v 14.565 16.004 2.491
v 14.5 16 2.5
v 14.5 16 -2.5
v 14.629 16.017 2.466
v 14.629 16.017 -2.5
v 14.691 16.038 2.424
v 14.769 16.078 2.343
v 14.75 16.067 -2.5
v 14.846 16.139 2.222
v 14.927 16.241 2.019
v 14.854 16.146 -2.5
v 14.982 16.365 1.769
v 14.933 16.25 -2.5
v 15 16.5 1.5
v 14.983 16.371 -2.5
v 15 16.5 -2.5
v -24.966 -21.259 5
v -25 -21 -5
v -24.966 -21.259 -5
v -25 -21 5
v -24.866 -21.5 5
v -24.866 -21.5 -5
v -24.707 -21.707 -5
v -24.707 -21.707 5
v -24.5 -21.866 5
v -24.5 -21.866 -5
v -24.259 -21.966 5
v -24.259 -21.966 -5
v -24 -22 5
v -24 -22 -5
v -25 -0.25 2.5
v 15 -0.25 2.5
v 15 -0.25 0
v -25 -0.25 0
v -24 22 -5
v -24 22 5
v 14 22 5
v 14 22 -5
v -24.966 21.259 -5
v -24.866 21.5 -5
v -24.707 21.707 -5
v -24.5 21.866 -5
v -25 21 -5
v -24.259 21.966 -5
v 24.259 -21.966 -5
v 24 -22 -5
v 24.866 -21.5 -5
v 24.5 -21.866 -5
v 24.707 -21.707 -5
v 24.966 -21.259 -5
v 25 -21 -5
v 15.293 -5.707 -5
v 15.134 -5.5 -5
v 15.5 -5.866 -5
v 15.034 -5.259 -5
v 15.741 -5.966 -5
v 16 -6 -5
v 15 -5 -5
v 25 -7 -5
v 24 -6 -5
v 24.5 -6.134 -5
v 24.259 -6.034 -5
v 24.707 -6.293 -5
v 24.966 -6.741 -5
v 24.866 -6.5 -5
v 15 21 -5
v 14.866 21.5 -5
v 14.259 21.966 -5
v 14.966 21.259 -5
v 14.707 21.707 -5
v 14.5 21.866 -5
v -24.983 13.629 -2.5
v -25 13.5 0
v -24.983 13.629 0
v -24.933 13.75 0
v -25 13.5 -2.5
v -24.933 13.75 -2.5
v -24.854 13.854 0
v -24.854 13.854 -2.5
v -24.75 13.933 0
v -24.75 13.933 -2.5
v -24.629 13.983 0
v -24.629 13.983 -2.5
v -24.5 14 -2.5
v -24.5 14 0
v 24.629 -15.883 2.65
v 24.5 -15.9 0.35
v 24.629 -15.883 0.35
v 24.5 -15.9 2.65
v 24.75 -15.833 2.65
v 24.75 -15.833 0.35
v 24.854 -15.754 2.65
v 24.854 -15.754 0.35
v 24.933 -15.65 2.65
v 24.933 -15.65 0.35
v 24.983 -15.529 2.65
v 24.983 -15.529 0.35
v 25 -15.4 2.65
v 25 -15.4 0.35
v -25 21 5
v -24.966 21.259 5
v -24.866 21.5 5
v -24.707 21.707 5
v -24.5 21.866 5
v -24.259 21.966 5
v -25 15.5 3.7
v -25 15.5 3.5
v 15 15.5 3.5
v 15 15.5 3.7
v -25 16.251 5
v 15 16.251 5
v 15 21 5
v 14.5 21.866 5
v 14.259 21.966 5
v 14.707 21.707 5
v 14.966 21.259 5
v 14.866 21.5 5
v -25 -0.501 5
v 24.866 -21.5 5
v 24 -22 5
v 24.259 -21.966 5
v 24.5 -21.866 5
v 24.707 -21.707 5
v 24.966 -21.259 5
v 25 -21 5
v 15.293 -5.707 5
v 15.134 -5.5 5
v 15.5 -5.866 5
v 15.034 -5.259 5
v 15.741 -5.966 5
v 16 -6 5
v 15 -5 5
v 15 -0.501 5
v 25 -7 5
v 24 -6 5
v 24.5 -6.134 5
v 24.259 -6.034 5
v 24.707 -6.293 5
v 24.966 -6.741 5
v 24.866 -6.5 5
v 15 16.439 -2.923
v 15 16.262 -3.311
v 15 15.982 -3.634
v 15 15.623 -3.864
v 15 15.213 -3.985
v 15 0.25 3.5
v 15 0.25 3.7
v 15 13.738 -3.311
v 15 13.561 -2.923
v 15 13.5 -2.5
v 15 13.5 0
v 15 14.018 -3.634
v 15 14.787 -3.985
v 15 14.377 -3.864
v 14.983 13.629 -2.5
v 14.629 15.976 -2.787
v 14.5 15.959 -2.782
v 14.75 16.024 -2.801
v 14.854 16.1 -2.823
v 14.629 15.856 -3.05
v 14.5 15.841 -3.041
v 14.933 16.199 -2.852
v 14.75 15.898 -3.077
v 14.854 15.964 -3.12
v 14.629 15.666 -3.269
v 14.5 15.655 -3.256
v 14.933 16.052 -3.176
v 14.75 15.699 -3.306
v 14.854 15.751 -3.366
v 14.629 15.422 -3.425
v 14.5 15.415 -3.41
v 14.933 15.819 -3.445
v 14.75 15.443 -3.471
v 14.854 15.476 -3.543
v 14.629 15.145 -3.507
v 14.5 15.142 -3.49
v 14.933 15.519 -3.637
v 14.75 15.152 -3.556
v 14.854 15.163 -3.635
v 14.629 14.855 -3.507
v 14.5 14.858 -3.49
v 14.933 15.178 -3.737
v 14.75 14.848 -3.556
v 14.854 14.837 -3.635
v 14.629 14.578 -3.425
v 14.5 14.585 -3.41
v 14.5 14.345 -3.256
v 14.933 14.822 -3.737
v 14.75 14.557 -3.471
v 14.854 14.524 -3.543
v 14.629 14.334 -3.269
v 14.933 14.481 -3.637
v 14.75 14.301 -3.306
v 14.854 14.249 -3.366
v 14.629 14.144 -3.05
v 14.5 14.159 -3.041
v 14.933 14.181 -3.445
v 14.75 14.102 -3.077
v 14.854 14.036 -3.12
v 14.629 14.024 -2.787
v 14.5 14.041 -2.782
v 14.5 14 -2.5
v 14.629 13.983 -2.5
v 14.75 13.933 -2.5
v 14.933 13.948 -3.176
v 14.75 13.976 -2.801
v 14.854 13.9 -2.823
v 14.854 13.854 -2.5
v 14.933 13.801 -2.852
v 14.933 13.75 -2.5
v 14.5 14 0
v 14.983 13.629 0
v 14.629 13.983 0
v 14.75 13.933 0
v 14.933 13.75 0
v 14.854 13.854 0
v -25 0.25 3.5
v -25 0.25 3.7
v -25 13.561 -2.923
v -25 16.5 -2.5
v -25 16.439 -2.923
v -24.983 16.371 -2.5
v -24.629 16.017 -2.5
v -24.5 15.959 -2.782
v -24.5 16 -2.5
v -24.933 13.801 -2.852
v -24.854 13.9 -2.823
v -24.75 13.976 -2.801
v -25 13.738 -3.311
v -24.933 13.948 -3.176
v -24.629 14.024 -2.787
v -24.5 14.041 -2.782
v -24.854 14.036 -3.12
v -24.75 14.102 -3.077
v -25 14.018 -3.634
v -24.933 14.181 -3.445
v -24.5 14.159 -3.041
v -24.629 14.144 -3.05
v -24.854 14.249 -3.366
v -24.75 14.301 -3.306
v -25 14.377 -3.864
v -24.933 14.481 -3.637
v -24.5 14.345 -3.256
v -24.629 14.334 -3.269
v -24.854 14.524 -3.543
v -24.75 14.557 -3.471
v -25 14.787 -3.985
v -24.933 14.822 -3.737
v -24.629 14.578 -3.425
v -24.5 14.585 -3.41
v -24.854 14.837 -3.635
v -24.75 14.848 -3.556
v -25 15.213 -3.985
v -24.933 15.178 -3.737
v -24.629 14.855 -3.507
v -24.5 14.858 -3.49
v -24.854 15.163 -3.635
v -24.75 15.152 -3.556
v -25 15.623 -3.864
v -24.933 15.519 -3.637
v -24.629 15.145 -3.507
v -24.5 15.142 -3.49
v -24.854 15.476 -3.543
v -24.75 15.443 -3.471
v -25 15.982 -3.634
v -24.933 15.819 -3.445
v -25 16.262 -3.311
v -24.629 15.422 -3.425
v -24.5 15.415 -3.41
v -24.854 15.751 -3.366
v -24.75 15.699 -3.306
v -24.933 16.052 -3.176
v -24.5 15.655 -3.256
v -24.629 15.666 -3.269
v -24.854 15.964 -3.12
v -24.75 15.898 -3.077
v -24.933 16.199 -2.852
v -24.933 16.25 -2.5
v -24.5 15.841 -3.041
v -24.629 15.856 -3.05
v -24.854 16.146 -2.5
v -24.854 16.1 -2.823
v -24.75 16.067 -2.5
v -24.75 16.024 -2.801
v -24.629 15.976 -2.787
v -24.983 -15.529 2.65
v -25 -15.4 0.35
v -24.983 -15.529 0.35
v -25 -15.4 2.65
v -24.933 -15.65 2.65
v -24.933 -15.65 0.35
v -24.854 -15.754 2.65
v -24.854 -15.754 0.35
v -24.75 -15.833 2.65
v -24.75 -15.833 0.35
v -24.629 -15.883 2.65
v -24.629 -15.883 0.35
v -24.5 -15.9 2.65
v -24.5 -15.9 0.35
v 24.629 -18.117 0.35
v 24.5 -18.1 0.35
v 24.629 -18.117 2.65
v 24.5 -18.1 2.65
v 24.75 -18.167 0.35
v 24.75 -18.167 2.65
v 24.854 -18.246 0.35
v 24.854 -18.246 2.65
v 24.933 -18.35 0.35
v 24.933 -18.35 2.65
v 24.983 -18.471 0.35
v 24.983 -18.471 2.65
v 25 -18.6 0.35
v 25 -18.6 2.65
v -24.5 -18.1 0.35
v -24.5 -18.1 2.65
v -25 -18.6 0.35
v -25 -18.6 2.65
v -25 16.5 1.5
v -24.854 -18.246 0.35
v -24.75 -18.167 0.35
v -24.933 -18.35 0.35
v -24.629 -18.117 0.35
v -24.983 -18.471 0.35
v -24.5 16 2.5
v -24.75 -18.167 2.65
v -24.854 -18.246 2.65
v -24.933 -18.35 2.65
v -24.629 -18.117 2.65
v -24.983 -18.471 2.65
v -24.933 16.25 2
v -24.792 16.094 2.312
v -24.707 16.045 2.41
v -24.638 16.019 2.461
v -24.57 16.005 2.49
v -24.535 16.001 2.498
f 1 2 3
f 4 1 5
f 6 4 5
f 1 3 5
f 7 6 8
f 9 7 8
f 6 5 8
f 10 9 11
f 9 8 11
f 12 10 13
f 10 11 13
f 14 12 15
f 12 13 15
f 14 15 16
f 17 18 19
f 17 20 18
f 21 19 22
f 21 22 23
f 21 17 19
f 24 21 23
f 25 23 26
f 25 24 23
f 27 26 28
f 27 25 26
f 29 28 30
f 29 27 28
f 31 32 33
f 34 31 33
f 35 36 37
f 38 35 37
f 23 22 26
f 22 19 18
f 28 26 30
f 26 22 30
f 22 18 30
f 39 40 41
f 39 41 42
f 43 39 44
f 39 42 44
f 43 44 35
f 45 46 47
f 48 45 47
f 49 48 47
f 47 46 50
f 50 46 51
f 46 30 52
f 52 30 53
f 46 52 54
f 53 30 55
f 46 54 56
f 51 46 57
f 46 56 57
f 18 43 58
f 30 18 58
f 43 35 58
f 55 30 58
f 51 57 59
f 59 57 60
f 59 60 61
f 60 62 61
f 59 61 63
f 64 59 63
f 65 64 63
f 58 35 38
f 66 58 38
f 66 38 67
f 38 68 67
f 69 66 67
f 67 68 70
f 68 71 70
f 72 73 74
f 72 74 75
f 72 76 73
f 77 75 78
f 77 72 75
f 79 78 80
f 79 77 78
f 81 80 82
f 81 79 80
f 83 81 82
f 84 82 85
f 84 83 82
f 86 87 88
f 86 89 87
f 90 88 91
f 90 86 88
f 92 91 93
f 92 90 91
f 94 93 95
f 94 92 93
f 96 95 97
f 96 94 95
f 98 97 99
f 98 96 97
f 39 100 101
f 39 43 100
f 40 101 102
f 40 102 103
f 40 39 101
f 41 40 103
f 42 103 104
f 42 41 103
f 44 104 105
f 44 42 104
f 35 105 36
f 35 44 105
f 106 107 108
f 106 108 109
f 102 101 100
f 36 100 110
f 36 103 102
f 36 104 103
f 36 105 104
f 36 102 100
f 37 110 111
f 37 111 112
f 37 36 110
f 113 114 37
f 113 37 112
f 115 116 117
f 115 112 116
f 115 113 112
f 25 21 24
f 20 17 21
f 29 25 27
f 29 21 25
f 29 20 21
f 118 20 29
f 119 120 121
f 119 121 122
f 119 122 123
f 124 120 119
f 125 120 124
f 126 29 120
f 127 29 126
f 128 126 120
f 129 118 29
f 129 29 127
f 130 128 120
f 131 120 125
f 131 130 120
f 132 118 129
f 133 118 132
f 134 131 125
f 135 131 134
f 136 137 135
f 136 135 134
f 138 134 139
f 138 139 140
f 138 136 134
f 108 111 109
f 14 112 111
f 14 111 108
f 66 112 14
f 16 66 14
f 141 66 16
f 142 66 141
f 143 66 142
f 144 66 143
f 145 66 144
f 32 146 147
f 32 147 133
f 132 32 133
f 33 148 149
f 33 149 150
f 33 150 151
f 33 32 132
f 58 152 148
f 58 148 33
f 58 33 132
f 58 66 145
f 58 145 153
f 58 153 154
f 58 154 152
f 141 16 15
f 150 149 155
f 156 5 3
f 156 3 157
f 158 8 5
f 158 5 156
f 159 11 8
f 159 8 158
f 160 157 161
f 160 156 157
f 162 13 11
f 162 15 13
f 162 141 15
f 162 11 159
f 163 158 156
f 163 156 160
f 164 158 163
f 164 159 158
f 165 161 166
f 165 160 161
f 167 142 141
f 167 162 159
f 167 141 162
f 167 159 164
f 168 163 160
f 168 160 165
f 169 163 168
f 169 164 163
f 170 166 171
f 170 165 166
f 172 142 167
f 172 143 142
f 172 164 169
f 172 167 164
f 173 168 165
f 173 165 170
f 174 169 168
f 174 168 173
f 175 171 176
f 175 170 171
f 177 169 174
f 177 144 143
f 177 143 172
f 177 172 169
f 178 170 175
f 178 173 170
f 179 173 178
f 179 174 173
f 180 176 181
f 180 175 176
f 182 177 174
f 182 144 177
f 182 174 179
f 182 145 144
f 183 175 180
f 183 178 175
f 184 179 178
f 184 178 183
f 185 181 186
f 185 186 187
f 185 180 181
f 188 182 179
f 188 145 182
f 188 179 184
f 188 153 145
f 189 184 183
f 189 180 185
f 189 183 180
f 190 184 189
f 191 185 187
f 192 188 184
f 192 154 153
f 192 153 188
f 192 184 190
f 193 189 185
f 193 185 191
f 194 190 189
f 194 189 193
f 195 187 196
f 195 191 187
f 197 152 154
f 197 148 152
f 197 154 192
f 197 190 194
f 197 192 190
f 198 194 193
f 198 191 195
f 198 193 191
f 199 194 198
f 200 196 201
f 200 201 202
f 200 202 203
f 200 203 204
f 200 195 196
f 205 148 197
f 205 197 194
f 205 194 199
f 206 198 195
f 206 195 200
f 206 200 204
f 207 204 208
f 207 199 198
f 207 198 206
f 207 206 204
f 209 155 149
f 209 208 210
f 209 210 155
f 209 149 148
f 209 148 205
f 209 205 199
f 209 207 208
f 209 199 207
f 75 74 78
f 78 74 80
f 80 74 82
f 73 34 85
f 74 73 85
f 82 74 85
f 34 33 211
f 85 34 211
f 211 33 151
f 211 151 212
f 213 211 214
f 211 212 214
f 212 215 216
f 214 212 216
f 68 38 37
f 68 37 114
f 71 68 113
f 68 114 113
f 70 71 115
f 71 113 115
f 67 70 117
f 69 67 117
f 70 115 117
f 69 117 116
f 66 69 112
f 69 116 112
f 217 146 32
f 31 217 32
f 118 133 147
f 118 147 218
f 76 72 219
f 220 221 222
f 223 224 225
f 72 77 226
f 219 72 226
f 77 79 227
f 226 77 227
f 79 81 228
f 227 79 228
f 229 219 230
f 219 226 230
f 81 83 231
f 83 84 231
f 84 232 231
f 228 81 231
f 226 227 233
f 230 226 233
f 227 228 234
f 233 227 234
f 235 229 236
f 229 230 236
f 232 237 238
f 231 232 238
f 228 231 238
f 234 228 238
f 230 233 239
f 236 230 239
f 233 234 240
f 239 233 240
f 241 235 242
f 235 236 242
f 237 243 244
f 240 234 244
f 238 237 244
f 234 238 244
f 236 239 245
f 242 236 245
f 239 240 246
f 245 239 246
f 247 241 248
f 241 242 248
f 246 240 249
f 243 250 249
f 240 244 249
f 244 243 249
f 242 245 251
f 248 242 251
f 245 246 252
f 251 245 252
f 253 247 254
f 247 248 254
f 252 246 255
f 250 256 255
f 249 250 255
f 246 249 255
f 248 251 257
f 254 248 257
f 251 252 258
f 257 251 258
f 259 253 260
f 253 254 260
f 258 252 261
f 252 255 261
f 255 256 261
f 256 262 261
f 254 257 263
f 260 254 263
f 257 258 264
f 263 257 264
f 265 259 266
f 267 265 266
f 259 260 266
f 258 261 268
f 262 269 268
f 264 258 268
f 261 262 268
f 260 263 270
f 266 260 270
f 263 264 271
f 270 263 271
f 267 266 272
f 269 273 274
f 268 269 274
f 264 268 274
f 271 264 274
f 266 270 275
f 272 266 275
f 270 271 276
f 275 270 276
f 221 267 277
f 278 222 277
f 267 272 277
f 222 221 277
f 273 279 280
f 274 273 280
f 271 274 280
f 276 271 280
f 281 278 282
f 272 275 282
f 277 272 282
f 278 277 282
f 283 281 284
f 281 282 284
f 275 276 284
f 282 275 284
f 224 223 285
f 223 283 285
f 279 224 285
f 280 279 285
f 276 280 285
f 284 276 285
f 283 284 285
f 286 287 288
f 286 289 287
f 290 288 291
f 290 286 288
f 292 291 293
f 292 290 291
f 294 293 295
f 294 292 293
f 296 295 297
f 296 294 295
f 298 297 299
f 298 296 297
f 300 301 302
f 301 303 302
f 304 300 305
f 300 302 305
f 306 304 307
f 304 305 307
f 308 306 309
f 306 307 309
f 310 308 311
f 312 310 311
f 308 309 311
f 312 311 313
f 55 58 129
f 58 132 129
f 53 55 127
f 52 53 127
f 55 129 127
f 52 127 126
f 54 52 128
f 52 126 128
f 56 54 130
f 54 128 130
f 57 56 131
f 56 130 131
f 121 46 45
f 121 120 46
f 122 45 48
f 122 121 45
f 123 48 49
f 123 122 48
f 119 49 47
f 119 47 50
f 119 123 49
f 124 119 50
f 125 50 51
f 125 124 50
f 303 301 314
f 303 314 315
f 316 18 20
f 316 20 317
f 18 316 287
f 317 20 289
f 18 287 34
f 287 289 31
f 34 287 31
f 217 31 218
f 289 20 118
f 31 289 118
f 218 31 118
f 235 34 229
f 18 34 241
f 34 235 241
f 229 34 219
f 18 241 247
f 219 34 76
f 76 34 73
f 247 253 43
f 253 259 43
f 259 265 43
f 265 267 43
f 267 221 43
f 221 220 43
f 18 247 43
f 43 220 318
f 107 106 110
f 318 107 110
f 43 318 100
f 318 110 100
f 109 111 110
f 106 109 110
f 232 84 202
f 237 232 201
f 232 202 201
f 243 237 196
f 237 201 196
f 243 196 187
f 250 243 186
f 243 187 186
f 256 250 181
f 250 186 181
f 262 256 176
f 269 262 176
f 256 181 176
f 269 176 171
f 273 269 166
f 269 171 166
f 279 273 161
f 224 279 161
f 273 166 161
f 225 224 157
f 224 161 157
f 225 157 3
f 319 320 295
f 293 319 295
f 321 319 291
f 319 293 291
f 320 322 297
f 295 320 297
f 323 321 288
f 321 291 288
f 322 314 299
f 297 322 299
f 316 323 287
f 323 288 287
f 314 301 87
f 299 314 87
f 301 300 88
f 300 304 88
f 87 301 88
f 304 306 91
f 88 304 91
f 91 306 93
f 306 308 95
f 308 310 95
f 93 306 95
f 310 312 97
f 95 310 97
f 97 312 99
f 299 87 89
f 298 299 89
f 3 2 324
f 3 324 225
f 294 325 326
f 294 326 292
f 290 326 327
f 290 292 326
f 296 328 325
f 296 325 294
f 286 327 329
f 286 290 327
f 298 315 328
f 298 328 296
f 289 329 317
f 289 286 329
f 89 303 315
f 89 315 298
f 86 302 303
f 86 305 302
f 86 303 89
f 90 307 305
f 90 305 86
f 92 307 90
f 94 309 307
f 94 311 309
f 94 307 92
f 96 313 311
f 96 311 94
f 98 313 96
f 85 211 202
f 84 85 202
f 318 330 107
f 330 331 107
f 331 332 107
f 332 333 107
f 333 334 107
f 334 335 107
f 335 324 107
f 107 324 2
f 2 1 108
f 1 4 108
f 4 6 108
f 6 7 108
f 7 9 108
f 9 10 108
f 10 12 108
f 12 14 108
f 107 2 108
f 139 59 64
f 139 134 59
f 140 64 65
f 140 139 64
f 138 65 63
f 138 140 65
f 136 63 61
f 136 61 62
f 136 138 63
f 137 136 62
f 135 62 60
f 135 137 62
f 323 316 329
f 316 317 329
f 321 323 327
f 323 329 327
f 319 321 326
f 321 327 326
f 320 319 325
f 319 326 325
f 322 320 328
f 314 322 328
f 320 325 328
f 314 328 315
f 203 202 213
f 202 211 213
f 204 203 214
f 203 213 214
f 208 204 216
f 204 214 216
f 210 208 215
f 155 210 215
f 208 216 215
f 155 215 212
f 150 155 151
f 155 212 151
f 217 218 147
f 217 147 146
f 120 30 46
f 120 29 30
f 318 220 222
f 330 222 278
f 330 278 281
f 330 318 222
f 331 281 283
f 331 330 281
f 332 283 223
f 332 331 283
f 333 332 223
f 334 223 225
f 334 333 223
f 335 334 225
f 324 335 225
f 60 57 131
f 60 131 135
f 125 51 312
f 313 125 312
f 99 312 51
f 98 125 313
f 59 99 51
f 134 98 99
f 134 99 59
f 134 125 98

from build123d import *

# Parameters (mm, degrees)
SKETCH_W        = 50
SKETCH_H        = 44
PAD_DEPTH       = 5
SKETCH001_W     = 2.2
SKETCH001_H     = 2.3
POCKET_DEPTH    = 50.001
POCKET002_DEPTH = 50.001
SKETCH002_W     = 10
SKETCH002_H     = 28
POCKET001_DEPTH = 10.001
FILLET_R        = 1
FILLET001_R     = 0.5
CHAMFER_1_ANGLE = 30
CHAMFER_1_SIZE  = 1.3
CHAMFER_2_ANGLE = 30
CHAMFER_2_SIZE  = 1.3


with BuildPart() as part:
    # Sketch (on XY_Plane of Origin) → Pad (new body, symmetric)
    with BuildSketch(Plane.XY):
        Rectangle(SKETCH_W, SKETCH_H)
    extrude(amount=PAD_DEPTH, both=True)

    # Sketch001 (on Face2 of Pad) → Pocket (cut, through all)
    with BuildSketch(Plane.YZ.offset(25)):
        Polygon((0.25, 5), (0.25, 3.5), (-0.25, 2.5), (-0.25, 0), (16, 0), (16, 2.5), (15.5, 3.5), (15.5, 5), align=None)
        with Locations((-17, 1.5)):
            Rectangle(SKETCH001_W, SKETCH001_H)
    extrude(amount=-POCKET_DEPTH, mode=Mode.SUBTRACT)

    # Sketch003 (on Face3 of Pocket) → Pocket002 (cut, through all)
    with BuildSketch(Plane.YZ.offset(25)):
        with BuildLine():
            ThreePointArc((16, 0), (15, 1), (14, 0))
            Line((14, 0), (14, -2.5))
            ThreePointArc((14, -2.5), (15, -3.5), (16, -2.5))
            Line((16, 0), (16, -2.5))
        make_face()
    extrude(amount=-POCKET002_DEPTH, mode=Mode.SUBTRACT)

    # Sketch002 (on Face4 of Pocket) → Pocket001 (cut, through all)
    with BuildSketch(Plane(origin=(0, 0, -5), x_dir=(1, 0, 0), z_dir=(0, 0, -1))):
        with Locations((20, -8)):
            Rectangle(SKETCH002_W, SKETCH002_H)
    extrude(amount=-POCKET001_DEPTH, mode=Mode.SUBTRACT)

    # Fillet
    fillet_edges = [part.edges().sort_by_distance(p)[0] for p in [
        (25, -22, 0),
        (25, -6, 0),
        (-25, -22, 0),
        (15, 22, 0),
        (15, -6, 0),
        (-25, 22, 0),
    ]]
    fillet(fillet_edges, radius=FILLET_R)

    # Fillet001
    fillet001_edges = [part.edges().sort_by_distance(p)[0] for p in [
        (-25, -15.9, 1.5),
        (-25, -18.1, 1.5),
        (25, -15.9, 1.5),
        (25, -18.1, 1.5),
        (15, 14, -1.25),
        (-25, 14, -1.25),
    ]]
    fillet(fillet001_edges, radius=FILLET001_R)

    # Chamfer 1
    chamfer_1_edges = [part.edges().sort_by_distance(p)[0] for p in [
        (-5, 15.5, 5),
    ]]
    chamfer_1_side = part.faces().sort_by_distance((-5, 15.5, 4.25))[0]
    chamfer(chamfer_1_edges, length=CHAMFER_1_SIZE, angle=CHAMFER_1_ANGLE, reference=chamfer_1_side)

    # Chamfer 2
    chamfer_2_edges = [part.edges().sort_by_distance(p)[0] for p in [
        (-5, 0.25, 5),
    ]]
    chamfer_2_side = part.faces().sort_by_distance((-5, 0.25, 4.25))[0]
    chamfer(chamfer_2_edges, length=CHAMFER_2_SIZE, angle=CHAMFER_2_ANGLE, reference=chamfer_2_side)


solid = part.part
